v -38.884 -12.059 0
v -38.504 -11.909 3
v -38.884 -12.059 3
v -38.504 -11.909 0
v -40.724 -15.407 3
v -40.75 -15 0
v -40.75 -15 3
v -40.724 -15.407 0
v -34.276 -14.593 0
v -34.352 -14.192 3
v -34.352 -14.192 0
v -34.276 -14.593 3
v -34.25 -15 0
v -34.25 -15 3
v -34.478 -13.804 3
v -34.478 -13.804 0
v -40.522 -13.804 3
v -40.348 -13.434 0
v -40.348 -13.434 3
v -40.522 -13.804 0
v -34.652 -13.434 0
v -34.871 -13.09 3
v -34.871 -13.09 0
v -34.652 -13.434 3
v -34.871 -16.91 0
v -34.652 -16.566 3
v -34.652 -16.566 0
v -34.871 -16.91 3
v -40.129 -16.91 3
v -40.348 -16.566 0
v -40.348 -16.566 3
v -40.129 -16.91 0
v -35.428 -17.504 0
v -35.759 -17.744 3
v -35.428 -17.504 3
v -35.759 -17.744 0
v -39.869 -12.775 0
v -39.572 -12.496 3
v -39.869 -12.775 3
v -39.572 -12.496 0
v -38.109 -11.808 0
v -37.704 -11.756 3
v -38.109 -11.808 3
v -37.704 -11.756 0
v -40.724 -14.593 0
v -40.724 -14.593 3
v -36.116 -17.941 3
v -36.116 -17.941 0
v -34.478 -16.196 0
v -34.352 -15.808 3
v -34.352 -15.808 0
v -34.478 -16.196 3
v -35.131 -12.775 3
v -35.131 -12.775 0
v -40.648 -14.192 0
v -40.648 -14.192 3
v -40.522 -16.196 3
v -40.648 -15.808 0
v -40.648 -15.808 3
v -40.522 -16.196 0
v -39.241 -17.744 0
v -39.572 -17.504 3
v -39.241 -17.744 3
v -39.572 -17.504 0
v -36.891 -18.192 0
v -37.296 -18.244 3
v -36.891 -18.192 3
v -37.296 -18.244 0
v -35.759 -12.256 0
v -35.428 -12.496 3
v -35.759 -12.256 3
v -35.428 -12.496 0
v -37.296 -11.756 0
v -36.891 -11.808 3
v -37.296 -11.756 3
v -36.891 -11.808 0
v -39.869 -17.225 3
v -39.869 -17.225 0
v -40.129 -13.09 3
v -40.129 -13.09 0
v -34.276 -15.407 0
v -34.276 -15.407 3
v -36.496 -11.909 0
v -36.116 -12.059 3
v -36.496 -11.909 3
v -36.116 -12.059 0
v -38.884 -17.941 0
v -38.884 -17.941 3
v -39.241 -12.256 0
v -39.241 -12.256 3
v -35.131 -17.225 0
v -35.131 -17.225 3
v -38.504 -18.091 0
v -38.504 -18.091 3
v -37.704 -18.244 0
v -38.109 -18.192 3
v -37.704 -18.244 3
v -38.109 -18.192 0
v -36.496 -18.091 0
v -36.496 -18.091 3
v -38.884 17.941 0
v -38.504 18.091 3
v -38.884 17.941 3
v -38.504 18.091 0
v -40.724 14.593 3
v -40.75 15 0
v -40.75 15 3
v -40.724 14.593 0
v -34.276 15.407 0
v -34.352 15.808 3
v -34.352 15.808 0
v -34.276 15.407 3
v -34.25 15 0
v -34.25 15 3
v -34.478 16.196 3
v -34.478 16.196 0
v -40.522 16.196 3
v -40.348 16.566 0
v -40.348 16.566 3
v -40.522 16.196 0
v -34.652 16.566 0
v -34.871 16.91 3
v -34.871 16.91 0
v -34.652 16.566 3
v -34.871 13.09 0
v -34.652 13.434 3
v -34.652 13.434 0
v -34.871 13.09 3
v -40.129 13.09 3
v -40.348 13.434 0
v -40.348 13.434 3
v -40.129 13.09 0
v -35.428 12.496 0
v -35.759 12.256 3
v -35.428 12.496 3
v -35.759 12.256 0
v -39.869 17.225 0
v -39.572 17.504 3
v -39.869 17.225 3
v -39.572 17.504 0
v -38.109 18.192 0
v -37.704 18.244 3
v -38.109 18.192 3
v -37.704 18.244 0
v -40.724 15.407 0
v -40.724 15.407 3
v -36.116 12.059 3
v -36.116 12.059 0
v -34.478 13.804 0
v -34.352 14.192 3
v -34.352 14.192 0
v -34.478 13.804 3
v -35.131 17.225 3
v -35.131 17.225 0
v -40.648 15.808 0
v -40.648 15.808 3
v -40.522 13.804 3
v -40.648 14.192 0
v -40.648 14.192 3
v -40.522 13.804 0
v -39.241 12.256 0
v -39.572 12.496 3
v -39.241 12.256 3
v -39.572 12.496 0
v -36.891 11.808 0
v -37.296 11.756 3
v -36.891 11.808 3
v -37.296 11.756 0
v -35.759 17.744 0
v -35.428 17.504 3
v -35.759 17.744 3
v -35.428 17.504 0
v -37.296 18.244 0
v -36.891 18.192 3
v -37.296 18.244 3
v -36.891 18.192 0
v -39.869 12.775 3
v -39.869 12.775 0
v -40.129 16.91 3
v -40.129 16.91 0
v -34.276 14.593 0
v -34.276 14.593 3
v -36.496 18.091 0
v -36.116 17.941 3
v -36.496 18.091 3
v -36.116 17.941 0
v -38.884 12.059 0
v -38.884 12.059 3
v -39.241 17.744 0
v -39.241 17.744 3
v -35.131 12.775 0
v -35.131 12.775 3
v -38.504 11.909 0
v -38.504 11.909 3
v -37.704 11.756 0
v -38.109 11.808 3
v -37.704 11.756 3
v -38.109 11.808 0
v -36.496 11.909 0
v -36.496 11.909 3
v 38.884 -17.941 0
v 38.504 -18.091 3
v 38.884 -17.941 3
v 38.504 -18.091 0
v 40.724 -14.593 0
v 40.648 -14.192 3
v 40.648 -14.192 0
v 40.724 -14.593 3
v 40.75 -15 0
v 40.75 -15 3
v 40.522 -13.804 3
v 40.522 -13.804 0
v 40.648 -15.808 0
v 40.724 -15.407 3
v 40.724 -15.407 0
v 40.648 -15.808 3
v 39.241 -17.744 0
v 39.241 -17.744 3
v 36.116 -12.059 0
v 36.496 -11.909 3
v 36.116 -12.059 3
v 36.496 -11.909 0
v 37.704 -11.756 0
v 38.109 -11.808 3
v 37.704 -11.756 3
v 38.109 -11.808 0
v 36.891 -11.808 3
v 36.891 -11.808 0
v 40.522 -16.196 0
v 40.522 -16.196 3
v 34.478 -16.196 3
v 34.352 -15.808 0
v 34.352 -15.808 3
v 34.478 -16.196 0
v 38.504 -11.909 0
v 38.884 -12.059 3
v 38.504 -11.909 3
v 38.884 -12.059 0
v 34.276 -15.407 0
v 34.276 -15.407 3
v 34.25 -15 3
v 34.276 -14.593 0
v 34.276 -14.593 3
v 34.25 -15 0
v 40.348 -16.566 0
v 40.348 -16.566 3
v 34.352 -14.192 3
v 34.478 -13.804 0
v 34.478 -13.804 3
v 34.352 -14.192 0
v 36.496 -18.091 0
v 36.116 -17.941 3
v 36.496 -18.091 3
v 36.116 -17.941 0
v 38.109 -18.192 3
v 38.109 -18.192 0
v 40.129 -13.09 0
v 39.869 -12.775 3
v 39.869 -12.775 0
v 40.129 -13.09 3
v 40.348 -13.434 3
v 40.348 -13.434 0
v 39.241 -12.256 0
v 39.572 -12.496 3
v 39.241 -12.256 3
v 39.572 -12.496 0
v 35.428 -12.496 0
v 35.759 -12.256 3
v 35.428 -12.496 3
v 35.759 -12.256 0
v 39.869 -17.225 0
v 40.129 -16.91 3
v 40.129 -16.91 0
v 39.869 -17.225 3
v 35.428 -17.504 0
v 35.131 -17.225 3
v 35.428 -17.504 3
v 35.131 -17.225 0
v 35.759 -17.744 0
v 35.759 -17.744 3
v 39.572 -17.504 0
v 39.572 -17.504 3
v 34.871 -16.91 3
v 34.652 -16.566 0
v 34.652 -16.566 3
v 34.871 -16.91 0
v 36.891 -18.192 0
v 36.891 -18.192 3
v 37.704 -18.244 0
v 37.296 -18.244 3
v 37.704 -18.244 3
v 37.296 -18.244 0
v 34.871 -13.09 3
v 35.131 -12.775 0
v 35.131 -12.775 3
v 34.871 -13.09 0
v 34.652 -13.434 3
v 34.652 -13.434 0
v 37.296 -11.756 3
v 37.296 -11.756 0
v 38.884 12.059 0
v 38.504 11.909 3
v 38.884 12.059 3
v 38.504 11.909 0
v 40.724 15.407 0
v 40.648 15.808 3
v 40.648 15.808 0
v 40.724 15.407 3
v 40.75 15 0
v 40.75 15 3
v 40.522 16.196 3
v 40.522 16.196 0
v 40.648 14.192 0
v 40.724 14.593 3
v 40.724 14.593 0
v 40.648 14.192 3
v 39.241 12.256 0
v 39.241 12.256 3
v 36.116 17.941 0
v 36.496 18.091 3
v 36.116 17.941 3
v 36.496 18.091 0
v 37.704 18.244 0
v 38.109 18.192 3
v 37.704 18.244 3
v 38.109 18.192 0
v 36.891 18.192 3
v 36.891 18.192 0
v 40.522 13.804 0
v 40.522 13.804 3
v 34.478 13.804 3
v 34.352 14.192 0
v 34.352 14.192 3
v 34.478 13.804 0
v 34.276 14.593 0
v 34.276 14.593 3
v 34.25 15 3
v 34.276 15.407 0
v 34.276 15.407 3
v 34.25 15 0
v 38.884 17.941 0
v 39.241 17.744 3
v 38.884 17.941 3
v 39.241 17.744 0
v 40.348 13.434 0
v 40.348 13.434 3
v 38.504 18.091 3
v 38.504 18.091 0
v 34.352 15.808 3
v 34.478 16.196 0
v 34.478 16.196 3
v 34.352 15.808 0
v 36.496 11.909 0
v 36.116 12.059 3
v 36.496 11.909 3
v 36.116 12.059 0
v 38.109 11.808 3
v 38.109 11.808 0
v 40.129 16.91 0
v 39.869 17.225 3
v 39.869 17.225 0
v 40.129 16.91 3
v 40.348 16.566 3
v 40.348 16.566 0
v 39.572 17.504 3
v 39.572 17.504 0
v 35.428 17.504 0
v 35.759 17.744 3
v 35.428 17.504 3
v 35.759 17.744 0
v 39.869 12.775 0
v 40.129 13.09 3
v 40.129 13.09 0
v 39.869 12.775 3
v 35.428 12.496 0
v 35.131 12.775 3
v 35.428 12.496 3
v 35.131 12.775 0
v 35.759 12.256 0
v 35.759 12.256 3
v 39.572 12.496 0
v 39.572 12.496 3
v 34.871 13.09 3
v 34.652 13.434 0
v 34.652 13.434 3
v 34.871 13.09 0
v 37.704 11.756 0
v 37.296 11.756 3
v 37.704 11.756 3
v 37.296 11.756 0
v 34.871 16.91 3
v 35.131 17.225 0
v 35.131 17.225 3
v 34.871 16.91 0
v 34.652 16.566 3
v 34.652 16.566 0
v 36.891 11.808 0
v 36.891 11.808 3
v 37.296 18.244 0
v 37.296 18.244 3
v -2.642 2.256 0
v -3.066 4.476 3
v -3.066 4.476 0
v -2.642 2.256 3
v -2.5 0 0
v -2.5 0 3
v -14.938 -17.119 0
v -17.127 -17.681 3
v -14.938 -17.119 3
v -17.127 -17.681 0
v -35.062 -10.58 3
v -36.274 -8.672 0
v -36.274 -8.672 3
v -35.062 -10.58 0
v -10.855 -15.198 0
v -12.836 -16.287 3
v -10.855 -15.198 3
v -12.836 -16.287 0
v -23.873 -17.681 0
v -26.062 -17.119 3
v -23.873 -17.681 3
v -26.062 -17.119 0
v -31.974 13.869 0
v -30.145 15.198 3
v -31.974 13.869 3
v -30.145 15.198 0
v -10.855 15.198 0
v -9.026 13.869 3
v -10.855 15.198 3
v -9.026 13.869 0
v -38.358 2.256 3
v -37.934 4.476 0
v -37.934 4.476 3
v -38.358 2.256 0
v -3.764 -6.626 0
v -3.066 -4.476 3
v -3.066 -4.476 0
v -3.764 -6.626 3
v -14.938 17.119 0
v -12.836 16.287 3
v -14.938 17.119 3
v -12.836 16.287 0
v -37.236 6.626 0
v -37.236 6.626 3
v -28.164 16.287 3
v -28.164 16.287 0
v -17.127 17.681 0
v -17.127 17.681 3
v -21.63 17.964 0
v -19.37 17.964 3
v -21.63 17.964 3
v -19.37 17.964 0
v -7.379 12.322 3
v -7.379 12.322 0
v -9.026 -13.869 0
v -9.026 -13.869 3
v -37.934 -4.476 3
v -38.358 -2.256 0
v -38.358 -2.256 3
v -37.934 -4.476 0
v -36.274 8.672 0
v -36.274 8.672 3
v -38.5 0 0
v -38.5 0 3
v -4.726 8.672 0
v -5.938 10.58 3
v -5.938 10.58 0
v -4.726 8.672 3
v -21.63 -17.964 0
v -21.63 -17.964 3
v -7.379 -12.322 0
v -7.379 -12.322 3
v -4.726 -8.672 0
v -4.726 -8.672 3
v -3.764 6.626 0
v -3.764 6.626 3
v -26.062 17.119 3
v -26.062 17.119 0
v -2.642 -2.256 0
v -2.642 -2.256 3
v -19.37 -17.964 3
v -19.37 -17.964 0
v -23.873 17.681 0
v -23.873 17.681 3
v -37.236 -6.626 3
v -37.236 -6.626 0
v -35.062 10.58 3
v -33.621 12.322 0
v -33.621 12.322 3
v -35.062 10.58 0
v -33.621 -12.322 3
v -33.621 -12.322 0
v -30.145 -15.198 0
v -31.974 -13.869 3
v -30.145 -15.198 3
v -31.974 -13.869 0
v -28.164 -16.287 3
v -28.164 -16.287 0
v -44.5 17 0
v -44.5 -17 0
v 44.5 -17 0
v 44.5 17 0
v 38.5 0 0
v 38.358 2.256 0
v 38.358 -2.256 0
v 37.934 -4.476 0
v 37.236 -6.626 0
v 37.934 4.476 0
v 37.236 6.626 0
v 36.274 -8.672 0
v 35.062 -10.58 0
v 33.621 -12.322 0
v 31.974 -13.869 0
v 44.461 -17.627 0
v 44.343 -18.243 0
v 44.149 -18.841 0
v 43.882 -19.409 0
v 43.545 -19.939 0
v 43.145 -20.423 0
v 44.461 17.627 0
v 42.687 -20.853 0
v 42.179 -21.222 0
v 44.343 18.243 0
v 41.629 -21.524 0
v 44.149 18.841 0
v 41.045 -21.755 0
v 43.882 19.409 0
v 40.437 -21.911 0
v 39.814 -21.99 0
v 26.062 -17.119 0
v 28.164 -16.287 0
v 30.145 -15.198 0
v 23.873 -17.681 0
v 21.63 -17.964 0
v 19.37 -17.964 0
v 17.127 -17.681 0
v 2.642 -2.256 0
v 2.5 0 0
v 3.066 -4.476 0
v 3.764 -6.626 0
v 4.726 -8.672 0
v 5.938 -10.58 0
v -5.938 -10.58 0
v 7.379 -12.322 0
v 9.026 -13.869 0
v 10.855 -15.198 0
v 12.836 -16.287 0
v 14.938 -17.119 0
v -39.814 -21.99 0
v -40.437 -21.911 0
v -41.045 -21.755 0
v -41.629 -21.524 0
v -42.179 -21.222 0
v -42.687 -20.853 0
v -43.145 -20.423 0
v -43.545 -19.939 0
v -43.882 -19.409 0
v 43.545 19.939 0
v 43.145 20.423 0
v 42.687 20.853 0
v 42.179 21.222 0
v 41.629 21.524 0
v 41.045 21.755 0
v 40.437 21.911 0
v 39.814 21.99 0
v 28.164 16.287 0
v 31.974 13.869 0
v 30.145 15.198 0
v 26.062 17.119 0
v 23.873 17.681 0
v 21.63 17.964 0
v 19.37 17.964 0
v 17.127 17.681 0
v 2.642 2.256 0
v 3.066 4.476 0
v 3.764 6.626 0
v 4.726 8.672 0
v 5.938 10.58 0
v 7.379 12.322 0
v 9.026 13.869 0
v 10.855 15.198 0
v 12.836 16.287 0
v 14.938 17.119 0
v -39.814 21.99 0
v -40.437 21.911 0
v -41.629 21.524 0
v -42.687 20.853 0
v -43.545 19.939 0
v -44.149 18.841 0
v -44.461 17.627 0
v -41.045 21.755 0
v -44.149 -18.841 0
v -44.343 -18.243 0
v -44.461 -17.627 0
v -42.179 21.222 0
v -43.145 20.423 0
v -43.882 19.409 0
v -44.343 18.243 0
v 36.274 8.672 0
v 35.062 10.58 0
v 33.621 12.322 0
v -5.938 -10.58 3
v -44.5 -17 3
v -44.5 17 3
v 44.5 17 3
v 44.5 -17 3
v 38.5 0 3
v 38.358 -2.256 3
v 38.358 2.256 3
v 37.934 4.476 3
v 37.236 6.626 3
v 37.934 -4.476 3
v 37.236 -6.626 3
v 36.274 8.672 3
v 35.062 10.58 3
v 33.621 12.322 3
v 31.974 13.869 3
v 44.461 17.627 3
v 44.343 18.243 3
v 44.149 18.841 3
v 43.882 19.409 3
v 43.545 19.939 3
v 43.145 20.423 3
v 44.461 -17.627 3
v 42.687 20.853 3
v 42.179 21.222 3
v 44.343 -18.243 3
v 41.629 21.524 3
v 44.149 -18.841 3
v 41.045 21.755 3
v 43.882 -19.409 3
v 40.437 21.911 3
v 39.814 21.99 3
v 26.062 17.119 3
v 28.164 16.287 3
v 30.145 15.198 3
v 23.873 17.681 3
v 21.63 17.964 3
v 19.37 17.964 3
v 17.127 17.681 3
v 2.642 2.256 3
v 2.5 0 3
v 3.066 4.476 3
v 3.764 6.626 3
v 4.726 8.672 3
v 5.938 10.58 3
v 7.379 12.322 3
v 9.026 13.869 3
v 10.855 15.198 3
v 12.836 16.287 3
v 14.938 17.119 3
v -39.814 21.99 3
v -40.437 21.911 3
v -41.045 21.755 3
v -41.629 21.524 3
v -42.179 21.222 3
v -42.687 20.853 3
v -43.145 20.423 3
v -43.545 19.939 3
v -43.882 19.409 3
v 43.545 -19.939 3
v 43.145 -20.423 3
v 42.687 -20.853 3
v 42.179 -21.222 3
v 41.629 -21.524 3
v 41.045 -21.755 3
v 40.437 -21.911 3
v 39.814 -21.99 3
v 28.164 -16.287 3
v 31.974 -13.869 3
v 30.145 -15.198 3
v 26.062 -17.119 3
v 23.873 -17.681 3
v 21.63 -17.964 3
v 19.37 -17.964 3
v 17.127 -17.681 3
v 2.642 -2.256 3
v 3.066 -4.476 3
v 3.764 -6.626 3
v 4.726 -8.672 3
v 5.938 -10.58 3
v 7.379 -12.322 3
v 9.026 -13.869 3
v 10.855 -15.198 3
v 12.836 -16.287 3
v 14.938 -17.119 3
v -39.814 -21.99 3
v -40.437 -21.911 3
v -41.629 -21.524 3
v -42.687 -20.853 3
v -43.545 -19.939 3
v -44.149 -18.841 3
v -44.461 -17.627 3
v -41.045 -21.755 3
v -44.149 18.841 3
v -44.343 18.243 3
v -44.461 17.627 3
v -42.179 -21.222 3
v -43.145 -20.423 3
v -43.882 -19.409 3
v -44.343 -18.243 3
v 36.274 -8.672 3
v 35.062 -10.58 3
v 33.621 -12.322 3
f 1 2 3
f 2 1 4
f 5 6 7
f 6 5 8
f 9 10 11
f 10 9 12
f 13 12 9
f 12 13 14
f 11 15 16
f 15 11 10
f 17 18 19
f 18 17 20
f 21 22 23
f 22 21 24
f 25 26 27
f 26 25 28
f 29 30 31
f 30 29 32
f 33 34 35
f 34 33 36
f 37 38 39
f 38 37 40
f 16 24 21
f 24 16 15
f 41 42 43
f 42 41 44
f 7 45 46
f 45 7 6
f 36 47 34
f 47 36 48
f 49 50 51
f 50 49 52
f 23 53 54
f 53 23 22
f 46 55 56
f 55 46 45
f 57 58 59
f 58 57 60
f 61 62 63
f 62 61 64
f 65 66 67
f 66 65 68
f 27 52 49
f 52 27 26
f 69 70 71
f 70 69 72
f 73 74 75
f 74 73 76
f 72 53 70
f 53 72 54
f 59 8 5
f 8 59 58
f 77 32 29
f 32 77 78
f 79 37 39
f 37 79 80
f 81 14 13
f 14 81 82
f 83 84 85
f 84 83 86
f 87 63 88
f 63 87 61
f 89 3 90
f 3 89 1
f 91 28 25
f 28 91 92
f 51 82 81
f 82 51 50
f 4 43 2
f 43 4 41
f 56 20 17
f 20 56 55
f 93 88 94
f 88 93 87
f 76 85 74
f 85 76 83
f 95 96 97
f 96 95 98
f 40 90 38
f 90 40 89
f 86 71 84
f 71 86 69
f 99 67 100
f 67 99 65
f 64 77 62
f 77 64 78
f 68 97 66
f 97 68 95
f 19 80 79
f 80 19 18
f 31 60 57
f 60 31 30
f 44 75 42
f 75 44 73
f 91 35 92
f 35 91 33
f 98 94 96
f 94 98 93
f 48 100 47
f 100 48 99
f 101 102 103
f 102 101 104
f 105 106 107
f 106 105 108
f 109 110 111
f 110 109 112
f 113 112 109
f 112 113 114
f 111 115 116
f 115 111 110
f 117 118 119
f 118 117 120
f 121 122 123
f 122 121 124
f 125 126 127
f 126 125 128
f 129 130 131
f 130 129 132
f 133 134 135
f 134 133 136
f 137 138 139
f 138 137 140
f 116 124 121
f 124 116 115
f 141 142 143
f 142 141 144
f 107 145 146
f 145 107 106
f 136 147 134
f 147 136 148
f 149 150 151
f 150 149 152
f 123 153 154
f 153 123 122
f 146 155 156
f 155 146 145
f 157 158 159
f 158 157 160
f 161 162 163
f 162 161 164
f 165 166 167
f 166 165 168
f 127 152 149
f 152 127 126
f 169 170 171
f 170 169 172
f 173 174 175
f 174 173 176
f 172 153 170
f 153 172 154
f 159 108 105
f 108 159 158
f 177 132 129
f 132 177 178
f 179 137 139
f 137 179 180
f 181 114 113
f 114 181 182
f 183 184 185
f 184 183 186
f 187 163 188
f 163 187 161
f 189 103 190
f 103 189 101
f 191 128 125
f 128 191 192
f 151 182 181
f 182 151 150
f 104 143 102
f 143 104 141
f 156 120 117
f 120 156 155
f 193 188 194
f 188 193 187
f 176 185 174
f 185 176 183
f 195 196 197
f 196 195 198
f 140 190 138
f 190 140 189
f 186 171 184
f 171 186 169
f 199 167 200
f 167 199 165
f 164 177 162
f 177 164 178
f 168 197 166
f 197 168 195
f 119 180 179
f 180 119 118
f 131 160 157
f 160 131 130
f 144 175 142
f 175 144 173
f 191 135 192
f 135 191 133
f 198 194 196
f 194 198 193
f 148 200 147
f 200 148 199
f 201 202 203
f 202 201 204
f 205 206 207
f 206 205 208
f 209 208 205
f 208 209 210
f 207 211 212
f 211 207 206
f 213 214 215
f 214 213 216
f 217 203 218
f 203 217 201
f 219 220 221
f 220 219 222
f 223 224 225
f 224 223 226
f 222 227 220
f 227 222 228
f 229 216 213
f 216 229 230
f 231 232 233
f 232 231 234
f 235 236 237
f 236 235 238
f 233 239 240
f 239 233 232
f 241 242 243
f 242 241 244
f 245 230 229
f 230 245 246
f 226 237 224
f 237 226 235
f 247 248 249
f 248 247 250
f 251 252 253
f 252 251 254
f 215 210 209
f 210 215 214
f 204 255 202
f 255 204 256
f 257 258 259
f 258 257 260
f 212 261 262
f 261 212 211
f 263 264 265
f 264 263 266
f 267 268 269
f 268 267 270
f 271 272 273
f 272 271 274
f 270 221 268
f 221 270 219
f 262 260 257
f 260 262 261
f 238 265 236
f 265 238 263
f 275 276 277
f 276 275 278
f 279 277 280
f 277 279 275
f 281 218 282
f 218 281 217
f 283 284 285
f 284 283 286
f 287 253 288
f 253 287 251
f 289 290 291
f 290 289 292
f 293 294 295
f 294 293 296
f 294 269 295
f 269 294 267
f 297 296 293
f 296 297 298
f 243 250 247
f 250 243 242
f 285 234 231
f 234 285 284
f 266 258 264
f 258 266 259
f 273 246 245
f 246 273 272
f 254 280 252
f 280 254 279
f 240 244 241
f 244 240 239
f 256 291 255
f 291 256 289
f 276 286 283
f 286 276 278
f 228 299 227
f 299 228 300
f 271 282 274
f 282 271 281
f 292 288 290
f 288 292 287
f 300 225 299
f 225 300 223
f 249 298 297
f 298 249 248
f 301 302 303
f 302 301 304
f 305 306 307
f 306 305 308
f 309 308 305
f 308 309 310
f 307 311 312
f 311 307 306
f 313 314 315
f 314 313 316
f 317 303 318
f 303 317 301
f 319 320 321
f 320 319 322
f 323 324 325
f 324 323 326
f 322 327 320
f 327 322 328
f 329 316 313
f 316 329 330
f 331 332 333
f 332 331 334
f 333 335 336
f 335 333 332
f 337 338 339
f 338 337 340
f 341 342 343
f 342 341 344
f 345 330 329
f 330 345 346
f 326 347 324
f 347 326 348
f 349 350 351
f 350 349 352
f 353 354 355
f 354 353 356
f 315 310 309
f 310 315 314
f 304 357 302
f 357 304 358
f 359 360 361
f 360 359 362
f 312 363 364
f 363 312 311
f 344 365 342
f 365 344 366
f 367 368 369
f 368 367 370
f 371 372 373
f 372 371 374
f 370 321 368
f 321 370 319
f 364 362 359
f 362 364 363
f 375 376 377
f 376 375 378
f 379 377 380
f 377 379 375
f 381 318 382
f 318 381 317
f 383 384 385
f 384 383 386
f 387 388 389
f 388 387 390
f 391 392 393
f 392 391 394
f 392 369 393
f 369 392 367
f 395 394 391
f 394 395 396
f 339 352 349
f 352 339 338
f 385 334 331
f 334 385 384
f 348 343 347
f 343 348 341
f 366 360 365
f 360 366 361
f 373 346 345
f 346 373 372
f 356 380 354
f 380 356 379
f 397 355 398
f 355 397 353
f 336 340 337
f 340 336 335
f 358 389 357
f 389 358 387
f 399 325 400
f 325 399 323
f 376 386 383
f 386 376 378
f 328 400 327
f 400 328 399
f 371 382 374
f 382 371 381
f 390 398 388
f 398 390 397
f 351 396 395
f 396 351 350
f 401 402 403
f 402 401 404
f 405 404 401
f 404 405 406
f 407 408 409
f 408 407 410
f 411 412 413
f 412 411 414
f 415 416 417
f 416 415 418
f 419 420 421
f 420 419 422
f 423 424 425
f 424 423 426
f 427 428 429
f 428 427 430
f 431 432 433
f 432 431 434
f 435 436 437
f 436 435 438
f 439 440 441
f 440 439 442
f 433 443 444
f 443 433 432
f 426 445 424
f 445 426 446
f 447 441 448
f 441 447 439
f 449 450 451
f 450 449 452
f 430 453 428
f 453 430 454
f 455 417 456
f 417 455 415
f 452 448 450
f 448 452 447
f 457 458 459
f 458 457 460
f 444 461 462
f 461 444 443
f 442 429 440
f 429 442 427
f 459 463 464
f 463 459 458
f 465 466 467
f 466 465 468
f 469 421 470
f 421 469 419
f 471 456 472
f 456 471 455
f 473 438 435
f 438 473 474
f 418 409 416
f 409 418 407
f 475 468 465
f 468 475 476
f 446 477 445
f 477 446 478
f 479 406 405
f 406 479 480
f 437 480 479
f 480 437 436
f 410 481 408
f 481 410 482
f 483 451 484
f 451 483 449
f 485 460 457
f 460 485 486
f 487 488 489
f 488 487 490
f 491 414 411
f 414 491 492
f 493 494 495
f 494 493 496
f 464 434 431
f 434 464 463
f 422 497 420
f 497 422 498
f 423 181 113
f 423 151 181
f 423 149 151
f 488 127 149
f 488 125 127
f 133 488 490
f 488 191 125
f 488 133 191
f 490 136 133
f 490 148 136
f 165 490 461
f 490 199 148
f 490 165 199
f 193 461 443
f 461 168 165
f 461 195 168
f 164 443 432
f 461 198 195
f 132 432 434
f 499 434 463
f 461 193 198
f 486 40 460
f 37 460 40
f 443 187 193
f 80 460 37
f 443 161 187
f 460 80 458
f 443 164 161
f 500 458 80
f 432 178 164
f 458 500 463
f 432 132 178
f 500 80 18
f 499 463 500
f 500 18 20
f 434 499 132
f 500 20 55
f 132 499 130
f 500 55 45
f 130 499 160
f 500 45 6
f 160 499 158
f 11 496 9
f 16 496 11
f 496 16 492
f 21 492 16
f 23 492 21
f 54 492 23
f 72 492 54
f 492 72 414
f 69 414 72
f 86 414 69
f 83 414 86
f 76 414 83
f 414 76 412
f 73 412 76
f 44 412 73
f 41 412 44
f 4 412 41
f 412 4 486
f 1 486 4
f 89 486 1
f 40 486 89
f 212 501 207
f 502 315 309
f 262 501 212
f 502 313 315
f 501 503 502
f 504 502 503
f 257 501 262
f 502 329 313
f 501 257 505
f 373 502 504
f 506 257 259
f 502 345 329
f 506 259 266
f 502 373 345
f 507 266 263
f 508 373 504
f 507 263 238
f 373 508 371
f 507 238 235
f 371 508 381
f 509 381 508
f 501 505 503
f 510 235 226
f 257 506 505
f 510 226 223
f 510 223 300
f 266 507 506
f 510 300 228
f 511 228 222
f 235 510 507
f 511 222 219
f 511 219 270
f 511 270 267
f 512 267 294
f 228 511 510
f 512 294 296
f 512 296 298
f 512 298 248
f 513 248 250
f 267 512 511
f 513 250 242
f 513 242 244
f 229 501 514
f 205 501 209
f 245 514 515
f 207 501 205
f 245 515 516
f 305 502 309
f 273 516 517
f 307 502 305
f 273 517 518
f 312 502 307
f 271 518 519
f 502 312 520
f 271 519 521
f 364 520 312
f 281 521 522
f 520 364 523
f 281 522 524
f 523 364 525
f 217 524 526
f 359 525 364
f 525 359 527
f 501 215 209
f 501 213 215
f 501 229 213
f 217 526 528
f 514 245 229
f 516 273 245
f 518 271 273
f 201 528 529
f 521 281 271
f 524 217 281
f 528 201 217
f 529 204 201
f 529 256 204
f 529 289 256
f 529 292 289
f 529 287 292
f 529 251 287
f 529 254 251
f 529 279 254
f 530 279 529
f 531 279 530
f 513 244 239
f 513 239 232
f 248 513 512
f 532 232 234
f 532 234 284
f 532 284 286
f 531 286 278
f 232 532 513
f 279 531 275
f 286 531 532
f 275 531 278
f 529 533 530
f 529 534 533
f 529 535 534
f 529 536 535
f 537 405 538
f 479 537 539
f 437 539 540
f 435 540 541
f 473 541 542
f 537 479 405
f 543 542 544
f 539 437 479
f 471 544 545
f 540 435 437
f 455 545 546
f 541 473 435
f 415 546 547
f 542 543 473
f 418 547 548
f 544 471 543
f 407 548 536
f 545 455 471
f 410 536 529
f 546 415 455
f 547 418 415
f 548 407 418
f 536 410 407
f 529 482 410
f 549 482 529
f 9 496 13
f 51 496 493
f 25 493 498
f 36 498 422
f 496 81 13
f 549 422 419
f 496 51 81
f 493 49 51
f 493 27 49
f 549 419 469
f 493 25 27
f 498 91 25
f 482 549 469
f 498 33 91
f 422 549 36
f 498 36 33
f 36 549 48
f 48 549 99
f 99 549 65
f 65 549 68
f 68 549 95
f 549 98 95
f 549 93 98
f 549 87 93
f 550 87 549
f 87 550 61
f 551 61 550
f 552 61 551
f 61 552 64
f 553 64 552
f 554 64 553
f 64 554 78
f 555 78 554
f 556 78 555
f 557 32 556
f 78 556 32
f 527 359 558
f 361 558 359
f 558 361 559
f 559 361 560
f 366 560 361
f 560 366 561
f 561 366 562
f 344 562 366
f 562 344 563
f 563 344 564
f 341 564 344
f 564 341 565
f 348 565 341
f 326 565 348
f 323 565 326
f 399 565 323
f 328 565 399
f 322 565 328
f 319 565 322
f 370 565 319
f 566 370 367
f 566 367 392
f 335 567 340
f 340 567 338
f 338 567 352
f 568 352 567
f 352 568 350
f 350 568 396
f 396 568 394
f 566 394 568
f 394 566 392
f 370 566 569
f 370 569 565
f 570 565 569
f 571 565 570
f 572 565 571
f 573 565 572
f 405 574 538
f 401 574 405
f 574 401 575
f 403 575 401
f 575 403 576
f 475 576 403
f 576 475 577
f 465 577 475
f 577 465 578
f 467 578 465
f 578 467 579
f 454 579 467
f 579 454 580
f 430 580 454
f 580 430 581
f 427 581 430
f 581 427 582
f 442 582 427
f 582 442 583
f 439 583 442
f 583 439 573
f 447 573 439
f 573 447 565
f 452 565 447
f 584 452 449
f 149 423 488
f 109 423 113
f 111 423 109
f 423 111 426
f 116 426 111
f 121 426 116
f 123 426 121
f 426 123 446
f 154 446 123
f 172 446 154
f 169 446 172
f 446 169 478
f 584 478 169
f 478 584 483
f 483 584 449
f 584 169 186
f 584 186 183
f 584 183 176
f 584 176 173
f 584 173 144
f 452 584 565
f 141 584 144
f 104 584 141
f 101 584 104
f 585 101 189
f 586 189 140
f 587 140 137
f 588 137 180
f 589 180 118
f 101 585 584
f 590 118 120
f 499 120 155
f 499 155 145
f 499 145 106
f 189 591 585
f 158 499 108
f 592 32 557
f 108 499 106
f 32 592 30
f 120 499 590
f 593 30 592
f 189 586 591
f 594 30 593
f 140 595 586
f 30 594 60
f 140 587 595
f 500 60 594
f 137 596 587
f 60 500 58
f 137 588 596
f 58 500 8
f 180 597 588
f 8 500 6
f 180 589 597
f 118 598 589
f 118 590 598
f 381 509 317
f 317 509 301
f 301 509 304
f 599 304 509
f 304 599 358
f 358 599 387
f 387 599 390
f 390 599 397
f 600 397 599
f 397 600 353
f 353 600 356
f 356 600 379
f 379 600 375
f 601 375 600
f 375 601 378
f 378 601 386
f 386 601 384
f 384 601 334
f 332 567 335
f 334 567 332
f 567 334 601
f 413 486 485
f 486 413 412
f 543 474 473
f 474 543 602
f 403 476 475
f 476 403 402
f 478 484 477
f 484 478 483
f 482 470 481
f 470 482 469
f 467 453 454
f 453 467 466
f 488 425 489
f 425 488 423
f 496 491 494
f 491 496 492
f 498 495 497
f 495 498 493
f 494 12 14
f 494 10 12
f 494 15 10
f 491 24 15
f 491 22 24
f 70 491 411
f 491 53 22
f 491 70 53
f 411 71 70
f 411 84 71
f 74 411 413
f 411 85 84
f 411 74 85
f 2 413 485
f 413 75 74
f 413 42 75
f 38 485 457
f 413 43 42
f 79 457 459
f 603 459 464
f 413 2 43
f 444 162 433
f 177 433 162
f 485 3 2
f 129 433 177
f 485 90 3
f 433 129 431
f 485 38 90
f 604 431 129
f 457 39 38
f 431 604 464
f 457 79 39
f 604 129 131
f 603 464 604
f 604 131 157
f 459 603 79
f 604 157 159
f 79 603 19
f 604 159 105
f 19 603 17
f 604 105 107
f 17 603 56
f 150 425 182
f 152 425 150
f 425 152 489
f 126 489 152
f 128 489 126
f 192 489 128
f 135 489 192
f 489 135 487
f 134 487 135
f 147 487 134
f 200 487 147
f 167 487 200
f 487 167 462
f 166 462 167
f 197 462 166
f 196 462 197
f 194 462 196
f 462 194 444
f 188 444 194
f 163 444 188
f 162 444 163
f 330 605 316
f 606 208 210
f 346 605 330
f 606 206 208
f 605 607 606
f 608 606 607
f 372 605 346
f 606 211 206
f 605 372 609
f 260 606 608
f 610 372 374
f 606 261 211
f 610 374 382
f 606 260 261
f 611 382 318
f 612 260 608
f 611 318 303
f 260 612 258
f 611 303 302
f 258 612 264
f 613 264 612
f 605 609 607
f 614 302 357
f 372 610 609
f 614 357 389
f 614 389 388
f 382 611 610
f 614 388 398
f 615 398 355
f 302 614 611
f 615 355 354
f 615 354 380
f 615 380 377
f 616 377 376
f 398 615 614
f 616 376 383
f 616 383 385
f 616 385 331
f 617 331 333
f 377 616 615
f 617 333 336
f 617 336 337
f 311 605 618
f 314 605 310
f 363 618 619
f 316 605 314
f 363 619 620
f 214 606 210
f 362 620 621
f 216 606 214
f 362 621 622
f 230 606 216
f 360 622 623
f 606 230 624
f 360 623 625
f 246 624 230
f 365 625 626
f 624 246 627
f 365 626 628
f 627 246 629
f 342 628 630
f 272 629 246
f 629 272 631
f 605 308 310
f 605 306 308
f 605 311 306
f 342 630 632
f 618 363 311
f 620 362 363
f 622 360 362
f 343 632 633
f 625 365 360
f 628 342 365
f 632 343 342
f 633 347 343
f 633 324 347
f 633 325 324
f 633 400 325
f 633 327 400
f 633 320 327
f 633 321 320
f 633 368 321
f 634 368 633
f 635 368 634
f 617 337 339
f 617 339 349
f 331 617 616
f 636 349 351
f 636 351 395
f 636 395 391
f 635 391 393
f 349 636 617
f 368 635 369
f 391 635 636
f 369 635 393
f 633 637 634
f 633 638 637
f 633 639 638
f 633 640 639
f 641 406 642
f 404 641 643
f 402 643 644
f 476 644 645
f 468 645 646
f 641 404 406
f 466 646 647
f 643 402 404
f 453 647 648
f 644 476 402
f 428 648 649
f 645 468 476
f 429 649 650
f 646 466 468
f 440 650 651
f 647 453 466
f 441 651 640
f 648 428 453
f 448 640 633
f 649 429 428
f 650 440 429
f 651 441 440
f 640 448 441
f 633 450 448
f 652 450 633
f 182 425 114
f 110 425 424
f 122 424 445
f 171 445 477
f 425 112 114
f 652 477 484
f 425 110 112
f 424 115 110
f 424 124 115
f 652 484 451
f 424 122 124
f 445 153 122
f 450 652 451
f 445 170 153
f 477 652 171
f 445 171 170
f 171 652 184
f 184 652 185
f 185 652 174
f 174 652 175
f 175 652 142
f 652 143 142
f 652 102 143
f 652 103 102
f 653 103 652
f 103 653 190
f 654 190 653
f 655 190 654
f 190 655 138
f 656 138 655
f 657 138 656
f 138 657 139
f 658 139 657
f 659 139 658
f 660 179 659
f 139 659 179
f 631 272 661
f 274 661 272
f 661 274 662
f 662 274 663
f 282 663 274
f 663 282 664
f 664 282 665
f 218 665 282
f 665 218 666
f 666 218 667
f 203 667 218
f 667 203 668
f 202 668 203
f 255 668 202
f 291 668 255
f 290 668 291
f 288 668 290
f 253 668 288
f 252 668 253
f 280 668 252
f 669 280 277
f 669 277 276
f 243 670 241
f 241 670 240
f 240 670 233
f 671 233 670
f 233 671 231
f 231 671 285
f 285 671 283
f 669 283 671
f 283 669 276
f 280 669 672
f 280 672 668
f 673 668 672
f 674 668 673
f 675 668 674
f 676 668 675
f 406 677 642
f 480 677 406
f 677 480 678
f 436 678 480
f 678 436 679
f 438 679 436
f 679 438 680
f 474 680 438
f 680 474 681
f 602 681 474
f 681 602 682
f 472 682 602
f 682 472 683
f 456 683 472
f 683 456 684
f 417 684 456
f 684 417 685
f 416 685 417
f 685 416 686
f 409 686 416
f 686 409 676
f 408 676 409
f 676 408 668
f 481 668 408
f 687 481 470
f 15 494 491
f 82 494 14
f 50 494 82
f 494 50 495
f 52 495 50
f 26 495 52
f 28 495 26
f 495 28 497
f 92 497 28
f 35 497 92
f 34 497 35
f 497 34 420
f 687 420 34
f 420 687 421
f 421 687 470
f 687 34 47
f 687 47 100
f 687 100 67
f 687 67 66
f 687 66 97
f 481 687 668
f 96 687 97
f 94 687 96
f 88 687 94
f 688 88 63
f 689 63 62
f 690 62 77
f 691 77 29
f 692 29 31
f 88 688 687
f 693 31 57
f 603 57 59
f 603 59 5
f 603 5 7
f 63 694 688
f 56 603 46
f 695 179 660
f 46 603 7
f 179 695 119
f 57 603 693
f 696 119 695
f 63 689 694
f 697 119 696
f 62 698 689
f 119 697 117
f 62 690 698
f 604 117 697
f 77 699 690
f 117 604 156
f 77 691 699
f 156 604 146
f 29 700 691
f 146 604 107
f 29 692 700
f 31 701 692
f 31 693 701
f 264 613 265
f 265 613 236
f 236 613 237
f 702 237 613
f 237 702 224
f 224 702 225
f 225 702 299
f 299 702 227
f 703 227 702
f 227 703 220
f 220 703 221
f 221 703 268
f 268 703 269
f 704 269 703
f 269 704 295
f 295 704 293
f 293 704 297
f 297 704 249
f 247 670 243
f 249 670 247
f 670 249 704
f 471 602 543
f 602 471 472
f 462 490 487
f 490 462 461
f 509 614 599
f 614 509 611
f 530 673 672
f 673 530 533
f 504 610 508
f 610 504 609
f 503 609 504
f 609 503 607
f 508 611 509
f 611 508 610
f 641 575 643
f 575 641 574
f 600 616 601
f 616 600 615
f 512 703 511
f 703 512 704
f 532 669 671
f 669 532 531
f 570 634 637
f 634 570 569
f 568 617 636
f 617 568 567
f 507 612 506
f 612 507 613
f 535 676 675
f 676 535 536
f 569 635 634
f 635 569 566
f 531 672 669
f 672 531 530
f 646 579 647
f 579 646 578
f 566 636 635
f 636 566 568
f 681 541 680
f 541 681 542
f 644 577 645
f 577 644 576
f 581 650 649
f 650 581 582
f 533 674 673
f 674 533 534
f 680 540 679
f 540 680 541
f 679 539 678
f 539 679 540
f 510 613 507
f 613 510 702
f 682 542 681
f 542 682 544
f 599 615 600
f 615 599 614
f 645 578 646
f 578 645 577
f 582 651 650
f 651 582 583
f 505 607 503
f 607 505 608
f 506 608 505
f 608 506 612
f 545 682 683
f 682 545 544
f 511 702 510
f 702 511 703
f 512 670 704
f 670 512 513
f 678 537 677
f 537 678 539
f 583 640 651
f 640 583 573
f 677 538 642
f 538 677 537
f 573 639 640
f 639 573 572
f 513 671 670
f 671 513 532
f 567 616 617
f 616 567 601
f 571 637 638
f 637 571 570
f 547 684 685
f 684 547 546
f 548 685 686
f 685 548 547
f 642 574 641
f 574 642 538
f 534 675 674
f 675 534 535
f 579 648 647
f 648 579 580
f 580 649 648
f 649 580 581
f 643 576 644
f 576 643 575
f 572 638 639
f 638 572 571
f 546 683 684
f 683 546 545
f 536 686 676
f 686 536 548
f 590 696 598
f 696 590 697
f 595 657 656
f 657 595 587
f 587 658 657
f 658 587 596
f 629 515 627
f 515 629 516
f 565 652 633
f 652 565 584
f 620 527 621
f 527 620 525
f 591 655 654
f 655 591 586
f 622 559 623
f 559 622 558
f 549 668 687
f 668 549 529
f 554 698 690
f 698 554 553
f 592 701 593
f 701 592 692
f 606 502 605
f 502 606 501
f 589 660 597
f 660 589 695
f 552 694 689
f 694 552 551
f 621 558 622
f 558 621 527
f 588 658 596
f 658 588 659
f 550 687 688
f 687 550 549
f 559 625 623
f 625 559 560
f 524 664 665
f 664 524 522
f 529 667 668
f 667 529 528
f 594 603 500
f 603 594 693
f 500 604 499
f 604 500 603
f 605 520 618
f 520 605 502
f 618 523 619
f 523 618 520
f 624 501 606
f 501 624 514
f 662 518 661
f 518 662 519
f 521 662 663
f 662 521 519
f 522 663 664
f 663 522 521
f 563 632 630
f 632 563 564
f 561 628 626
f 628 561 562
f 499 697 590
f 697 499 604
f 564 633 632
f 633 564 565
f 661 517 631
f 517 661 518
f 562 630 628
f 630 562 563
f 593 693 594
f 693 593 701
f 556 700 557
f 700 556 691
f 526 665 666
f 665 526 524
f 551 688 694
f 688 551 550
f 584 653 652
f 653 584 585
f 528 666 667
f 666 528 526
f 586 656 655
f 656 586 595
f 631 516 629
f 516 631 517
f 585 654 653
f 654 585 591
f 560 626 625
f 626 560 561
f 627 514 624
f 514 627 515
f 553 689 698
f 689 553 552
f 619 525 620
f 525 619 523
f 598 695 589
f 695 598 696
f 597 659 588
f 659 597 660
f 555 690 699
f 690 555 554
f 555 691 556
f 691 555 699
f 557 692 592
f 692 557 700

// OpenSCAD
$fn = 50;


difference() {
	union() {
		hull() {
			translate(v = [-39.5000000000, 17.0000000000, 0]) {
				cylinder(h = 3, r = 5);
			}
			translate(v = [39.5000000000, 17.0000000000, 0]) {
				cylinder(h = 3, r = 5);
			}
			translate(v = [-39.5000000000, -17.0000000000, 0]) {
				cylinder(h = 3, r = 5);
			}
			translate(v = [39.5000000000, -17.0000000000, 0]) {
				cylinder(h = 3, r = 5);
			}
		}
	}
	union() {
		#translate(v = [-37.5000000000, -15.0000000000, -100.0000000000]) {
			cylinder(h = 200, r = 3.2500000000);
		}
		#translate(v = [-37.5000000000, 15.0000000000, -100.0000000000]) {
			cylinder(h = 200, r = 3.2500000000);
		}
		#translate(v = [37.5000000000, -15.0000000000, -100.0000000000]) {
			cylinder(h = 200, r = 3.2500000000);
		}
		#translate(v = [37.5000000000, 15.0000000000, -100.0000000000]) {
			cylinder(h = 200, r = 3.2500000000);
		}
		#translate(v = [-20.5000000000, 0, 0]) {
			cylinder(h = 3, r = 18.0000000000);
		}
		#translate(v = [20.5000000000, 0, 0]) {
			cylinder(h = 3, r = 18.0000000000);
		}
	}
}
